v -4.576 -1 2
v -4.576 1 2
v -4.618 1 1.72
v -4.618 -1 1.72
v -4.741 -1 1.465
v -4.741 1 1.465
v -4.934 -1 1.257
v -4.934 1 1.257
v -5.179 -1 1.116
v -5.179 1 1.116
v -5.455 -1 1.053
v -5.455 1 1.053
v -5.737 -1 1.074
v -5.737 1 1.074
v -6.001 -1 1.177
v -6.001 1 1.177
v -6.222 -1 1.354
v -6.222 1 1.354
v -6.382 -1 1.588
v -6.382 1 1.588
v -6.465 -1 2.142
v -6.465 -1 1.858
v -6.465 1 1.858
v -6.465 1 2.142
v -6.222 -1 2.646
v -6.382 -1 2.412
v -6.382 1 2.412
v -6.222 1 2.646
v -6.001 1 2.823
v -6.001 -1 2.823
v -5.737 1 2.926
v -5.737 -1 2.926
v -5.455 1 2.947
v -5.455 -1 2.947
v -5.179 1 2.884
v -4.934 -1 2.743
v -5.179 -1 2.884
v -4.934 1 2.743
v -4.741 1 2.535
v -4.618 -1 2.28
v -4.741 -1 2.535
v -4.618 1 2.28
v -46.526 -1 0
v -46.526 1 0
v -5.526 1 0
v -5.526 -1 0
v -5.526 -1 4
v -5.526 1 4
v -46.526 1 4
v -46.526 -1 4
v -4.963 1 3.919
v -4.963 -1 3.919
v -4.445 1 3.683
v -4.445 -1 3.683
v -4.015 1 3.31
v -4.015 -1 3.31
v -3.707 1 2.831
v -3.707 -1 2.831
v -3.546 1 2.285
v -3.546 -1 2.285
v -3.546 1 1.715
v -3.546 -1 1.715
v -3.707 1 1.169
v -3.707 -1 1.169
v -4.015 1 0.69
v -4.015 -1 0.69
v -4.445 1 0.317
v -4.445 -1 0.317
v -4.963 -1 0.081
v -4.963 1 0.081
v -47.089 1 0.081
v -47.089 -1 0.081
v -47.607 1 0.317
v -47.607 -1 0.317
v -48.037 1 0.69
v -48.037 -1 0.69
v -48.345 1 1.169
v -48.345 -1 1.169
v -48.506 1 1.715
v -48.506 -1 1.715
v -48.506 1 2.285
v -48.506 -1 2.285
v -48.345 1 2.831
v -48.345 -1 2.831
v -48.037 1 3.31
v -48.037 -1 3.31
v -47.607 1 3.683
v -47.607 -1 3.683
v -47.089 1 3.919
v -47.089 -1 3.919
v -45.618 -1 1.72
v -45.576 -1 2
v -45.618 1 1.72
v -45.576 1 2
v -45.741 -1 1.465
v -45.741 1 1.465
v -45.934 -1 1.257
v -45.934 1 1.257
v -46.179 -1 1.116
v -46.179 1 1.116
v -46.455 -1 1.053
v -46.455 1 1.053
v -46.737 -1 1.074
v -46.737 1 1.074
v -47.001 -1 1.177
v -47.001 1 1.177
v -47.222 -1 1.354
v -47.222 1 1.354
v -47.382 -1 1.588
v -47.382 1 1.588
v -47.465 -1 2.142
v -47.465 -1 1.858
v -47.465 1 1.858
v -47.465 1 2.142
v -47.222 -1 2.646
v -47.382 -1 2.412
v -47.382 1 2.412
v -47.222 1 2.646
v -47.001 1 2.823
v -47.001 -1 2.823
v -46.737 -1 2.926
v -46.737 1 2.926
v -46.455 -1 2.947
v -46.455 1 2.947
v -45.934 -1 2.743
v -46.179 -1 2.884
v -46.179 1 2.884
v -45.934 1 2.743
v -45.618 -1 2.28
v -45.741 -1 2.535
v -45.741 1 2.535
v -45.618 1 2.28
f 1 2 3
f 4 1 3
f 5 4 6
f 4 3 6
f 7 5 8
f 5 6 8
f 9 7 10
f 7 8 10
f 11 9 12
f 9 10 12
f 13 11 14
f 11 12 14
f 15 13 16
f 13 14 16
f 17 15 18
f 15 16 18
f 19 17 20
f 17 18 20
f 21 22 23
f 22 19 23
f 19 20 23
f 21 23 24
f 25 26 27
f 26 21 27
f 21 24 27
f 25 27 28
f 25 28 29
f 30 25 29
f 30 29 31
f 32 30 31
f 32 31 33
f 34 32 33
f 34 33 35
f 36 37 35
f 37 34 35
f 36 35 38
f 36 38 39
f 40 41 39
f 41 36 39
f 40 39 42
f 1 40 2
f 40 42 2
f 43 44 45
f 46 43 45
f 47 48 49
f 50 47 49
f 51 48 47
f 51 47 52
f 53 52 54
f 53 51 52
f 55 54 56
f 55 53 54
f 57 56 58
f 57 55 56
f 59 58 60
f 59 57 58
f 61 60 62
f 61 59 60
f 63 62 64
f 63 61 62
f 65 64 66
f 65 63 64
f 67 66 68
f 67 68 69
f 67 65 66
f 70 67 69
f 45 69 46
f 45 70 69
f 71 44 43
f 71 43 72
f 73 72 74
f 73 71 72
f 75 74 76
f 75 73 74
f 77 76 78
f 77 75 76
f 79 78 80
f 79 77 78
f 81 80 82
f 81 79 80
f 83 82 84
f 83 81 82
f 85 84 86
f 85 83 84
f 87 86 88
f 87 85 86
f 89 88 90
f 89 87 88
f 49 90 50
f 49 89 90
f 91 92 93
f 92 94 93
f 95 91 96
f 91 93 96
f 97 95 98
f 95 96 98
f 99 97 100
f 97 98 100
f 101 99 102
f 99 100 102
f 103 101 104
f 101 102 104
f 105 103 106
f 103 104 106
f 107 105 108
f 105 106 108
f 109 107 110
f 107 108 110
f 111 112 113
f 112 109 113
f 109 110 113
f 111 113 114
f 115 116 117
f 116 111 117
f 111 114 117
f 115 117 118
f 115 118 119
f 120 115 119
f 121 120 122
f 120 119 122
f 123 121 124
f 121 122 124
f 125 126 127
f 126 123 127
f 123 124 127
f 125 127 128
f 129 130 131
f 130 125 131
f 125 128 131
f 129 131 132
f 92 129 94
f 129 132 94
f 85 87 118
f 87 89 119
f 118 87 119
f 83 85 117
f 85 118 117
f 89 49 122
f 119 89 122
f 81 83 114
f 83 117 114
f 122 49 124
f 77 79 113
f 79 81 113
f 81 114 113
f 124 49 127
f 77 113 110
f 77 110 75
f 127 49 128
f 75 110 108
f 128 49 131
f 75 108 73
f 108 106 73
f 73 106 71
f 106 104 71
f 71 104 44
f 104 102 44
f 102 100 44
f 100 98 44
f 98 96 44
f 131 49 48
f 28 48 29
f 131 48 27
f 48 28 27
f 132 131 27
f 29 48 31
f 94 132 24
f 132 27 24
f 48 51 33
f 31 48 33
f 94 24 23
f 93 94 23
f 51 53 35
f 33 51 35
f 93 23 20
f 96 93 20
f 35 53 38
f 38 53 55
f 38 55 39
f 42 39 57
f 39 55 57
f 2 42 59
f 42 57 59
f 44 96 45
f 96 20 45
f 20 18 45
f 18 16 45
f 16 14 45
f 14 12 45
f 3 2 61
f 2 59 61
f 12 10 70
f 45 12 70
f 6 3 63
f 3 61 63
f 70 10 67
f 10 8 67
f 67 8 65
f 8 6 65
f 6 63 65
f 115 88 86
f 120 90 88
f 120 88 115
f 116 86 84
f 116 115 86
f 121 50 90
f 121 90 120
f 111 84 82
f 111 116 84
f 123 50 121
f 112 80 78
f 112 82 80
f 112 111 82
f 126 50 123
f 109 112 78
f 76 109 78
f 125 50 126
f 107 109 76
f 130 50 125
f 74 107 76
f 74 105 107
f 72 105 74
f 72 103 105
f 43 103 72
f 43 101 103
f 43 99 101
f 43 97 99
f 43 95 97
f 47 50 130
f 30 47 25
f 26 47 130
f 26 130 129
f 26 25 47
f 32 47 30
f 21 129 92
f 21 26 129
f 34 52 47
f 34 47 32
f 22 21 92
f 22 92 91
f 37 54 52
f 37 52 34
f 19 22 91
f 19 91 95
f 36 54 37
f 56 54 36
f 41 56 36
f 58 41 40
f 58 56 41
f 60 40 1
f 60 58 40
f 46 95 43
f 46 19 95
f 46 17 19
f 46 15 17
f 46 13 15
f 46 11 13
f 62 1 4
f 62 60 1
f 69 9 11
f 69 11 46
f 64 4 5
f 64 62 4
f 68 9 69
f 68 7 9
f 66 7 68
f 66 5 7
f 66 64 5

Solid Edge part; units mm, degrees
sketch "Sketch1" plane through (0, 0, 0) normal (0, -1, 0) x (1, 0, 0)
  line L0 (-46.526, 0) -> (-5.526, 0)
  arc A0 (-5.526, 4) -> (-5.526, 0) centre (-5.526, 2) cw
  line L1 (-5.526, 4) -> (-46.526, 4)
  arc A1 (-46.526, 0) -> (-46.526, 4) centre (-46.526, 2) cw
  circle A2 centre (-46.526, 2) radius 0.95
  circle A3 centre (-5.526, 2) radius 0.95
extrude "Protrusion1" add sketch "Sketch1" along normal mid plane 2
properties material "Stainless Steel, 420"
